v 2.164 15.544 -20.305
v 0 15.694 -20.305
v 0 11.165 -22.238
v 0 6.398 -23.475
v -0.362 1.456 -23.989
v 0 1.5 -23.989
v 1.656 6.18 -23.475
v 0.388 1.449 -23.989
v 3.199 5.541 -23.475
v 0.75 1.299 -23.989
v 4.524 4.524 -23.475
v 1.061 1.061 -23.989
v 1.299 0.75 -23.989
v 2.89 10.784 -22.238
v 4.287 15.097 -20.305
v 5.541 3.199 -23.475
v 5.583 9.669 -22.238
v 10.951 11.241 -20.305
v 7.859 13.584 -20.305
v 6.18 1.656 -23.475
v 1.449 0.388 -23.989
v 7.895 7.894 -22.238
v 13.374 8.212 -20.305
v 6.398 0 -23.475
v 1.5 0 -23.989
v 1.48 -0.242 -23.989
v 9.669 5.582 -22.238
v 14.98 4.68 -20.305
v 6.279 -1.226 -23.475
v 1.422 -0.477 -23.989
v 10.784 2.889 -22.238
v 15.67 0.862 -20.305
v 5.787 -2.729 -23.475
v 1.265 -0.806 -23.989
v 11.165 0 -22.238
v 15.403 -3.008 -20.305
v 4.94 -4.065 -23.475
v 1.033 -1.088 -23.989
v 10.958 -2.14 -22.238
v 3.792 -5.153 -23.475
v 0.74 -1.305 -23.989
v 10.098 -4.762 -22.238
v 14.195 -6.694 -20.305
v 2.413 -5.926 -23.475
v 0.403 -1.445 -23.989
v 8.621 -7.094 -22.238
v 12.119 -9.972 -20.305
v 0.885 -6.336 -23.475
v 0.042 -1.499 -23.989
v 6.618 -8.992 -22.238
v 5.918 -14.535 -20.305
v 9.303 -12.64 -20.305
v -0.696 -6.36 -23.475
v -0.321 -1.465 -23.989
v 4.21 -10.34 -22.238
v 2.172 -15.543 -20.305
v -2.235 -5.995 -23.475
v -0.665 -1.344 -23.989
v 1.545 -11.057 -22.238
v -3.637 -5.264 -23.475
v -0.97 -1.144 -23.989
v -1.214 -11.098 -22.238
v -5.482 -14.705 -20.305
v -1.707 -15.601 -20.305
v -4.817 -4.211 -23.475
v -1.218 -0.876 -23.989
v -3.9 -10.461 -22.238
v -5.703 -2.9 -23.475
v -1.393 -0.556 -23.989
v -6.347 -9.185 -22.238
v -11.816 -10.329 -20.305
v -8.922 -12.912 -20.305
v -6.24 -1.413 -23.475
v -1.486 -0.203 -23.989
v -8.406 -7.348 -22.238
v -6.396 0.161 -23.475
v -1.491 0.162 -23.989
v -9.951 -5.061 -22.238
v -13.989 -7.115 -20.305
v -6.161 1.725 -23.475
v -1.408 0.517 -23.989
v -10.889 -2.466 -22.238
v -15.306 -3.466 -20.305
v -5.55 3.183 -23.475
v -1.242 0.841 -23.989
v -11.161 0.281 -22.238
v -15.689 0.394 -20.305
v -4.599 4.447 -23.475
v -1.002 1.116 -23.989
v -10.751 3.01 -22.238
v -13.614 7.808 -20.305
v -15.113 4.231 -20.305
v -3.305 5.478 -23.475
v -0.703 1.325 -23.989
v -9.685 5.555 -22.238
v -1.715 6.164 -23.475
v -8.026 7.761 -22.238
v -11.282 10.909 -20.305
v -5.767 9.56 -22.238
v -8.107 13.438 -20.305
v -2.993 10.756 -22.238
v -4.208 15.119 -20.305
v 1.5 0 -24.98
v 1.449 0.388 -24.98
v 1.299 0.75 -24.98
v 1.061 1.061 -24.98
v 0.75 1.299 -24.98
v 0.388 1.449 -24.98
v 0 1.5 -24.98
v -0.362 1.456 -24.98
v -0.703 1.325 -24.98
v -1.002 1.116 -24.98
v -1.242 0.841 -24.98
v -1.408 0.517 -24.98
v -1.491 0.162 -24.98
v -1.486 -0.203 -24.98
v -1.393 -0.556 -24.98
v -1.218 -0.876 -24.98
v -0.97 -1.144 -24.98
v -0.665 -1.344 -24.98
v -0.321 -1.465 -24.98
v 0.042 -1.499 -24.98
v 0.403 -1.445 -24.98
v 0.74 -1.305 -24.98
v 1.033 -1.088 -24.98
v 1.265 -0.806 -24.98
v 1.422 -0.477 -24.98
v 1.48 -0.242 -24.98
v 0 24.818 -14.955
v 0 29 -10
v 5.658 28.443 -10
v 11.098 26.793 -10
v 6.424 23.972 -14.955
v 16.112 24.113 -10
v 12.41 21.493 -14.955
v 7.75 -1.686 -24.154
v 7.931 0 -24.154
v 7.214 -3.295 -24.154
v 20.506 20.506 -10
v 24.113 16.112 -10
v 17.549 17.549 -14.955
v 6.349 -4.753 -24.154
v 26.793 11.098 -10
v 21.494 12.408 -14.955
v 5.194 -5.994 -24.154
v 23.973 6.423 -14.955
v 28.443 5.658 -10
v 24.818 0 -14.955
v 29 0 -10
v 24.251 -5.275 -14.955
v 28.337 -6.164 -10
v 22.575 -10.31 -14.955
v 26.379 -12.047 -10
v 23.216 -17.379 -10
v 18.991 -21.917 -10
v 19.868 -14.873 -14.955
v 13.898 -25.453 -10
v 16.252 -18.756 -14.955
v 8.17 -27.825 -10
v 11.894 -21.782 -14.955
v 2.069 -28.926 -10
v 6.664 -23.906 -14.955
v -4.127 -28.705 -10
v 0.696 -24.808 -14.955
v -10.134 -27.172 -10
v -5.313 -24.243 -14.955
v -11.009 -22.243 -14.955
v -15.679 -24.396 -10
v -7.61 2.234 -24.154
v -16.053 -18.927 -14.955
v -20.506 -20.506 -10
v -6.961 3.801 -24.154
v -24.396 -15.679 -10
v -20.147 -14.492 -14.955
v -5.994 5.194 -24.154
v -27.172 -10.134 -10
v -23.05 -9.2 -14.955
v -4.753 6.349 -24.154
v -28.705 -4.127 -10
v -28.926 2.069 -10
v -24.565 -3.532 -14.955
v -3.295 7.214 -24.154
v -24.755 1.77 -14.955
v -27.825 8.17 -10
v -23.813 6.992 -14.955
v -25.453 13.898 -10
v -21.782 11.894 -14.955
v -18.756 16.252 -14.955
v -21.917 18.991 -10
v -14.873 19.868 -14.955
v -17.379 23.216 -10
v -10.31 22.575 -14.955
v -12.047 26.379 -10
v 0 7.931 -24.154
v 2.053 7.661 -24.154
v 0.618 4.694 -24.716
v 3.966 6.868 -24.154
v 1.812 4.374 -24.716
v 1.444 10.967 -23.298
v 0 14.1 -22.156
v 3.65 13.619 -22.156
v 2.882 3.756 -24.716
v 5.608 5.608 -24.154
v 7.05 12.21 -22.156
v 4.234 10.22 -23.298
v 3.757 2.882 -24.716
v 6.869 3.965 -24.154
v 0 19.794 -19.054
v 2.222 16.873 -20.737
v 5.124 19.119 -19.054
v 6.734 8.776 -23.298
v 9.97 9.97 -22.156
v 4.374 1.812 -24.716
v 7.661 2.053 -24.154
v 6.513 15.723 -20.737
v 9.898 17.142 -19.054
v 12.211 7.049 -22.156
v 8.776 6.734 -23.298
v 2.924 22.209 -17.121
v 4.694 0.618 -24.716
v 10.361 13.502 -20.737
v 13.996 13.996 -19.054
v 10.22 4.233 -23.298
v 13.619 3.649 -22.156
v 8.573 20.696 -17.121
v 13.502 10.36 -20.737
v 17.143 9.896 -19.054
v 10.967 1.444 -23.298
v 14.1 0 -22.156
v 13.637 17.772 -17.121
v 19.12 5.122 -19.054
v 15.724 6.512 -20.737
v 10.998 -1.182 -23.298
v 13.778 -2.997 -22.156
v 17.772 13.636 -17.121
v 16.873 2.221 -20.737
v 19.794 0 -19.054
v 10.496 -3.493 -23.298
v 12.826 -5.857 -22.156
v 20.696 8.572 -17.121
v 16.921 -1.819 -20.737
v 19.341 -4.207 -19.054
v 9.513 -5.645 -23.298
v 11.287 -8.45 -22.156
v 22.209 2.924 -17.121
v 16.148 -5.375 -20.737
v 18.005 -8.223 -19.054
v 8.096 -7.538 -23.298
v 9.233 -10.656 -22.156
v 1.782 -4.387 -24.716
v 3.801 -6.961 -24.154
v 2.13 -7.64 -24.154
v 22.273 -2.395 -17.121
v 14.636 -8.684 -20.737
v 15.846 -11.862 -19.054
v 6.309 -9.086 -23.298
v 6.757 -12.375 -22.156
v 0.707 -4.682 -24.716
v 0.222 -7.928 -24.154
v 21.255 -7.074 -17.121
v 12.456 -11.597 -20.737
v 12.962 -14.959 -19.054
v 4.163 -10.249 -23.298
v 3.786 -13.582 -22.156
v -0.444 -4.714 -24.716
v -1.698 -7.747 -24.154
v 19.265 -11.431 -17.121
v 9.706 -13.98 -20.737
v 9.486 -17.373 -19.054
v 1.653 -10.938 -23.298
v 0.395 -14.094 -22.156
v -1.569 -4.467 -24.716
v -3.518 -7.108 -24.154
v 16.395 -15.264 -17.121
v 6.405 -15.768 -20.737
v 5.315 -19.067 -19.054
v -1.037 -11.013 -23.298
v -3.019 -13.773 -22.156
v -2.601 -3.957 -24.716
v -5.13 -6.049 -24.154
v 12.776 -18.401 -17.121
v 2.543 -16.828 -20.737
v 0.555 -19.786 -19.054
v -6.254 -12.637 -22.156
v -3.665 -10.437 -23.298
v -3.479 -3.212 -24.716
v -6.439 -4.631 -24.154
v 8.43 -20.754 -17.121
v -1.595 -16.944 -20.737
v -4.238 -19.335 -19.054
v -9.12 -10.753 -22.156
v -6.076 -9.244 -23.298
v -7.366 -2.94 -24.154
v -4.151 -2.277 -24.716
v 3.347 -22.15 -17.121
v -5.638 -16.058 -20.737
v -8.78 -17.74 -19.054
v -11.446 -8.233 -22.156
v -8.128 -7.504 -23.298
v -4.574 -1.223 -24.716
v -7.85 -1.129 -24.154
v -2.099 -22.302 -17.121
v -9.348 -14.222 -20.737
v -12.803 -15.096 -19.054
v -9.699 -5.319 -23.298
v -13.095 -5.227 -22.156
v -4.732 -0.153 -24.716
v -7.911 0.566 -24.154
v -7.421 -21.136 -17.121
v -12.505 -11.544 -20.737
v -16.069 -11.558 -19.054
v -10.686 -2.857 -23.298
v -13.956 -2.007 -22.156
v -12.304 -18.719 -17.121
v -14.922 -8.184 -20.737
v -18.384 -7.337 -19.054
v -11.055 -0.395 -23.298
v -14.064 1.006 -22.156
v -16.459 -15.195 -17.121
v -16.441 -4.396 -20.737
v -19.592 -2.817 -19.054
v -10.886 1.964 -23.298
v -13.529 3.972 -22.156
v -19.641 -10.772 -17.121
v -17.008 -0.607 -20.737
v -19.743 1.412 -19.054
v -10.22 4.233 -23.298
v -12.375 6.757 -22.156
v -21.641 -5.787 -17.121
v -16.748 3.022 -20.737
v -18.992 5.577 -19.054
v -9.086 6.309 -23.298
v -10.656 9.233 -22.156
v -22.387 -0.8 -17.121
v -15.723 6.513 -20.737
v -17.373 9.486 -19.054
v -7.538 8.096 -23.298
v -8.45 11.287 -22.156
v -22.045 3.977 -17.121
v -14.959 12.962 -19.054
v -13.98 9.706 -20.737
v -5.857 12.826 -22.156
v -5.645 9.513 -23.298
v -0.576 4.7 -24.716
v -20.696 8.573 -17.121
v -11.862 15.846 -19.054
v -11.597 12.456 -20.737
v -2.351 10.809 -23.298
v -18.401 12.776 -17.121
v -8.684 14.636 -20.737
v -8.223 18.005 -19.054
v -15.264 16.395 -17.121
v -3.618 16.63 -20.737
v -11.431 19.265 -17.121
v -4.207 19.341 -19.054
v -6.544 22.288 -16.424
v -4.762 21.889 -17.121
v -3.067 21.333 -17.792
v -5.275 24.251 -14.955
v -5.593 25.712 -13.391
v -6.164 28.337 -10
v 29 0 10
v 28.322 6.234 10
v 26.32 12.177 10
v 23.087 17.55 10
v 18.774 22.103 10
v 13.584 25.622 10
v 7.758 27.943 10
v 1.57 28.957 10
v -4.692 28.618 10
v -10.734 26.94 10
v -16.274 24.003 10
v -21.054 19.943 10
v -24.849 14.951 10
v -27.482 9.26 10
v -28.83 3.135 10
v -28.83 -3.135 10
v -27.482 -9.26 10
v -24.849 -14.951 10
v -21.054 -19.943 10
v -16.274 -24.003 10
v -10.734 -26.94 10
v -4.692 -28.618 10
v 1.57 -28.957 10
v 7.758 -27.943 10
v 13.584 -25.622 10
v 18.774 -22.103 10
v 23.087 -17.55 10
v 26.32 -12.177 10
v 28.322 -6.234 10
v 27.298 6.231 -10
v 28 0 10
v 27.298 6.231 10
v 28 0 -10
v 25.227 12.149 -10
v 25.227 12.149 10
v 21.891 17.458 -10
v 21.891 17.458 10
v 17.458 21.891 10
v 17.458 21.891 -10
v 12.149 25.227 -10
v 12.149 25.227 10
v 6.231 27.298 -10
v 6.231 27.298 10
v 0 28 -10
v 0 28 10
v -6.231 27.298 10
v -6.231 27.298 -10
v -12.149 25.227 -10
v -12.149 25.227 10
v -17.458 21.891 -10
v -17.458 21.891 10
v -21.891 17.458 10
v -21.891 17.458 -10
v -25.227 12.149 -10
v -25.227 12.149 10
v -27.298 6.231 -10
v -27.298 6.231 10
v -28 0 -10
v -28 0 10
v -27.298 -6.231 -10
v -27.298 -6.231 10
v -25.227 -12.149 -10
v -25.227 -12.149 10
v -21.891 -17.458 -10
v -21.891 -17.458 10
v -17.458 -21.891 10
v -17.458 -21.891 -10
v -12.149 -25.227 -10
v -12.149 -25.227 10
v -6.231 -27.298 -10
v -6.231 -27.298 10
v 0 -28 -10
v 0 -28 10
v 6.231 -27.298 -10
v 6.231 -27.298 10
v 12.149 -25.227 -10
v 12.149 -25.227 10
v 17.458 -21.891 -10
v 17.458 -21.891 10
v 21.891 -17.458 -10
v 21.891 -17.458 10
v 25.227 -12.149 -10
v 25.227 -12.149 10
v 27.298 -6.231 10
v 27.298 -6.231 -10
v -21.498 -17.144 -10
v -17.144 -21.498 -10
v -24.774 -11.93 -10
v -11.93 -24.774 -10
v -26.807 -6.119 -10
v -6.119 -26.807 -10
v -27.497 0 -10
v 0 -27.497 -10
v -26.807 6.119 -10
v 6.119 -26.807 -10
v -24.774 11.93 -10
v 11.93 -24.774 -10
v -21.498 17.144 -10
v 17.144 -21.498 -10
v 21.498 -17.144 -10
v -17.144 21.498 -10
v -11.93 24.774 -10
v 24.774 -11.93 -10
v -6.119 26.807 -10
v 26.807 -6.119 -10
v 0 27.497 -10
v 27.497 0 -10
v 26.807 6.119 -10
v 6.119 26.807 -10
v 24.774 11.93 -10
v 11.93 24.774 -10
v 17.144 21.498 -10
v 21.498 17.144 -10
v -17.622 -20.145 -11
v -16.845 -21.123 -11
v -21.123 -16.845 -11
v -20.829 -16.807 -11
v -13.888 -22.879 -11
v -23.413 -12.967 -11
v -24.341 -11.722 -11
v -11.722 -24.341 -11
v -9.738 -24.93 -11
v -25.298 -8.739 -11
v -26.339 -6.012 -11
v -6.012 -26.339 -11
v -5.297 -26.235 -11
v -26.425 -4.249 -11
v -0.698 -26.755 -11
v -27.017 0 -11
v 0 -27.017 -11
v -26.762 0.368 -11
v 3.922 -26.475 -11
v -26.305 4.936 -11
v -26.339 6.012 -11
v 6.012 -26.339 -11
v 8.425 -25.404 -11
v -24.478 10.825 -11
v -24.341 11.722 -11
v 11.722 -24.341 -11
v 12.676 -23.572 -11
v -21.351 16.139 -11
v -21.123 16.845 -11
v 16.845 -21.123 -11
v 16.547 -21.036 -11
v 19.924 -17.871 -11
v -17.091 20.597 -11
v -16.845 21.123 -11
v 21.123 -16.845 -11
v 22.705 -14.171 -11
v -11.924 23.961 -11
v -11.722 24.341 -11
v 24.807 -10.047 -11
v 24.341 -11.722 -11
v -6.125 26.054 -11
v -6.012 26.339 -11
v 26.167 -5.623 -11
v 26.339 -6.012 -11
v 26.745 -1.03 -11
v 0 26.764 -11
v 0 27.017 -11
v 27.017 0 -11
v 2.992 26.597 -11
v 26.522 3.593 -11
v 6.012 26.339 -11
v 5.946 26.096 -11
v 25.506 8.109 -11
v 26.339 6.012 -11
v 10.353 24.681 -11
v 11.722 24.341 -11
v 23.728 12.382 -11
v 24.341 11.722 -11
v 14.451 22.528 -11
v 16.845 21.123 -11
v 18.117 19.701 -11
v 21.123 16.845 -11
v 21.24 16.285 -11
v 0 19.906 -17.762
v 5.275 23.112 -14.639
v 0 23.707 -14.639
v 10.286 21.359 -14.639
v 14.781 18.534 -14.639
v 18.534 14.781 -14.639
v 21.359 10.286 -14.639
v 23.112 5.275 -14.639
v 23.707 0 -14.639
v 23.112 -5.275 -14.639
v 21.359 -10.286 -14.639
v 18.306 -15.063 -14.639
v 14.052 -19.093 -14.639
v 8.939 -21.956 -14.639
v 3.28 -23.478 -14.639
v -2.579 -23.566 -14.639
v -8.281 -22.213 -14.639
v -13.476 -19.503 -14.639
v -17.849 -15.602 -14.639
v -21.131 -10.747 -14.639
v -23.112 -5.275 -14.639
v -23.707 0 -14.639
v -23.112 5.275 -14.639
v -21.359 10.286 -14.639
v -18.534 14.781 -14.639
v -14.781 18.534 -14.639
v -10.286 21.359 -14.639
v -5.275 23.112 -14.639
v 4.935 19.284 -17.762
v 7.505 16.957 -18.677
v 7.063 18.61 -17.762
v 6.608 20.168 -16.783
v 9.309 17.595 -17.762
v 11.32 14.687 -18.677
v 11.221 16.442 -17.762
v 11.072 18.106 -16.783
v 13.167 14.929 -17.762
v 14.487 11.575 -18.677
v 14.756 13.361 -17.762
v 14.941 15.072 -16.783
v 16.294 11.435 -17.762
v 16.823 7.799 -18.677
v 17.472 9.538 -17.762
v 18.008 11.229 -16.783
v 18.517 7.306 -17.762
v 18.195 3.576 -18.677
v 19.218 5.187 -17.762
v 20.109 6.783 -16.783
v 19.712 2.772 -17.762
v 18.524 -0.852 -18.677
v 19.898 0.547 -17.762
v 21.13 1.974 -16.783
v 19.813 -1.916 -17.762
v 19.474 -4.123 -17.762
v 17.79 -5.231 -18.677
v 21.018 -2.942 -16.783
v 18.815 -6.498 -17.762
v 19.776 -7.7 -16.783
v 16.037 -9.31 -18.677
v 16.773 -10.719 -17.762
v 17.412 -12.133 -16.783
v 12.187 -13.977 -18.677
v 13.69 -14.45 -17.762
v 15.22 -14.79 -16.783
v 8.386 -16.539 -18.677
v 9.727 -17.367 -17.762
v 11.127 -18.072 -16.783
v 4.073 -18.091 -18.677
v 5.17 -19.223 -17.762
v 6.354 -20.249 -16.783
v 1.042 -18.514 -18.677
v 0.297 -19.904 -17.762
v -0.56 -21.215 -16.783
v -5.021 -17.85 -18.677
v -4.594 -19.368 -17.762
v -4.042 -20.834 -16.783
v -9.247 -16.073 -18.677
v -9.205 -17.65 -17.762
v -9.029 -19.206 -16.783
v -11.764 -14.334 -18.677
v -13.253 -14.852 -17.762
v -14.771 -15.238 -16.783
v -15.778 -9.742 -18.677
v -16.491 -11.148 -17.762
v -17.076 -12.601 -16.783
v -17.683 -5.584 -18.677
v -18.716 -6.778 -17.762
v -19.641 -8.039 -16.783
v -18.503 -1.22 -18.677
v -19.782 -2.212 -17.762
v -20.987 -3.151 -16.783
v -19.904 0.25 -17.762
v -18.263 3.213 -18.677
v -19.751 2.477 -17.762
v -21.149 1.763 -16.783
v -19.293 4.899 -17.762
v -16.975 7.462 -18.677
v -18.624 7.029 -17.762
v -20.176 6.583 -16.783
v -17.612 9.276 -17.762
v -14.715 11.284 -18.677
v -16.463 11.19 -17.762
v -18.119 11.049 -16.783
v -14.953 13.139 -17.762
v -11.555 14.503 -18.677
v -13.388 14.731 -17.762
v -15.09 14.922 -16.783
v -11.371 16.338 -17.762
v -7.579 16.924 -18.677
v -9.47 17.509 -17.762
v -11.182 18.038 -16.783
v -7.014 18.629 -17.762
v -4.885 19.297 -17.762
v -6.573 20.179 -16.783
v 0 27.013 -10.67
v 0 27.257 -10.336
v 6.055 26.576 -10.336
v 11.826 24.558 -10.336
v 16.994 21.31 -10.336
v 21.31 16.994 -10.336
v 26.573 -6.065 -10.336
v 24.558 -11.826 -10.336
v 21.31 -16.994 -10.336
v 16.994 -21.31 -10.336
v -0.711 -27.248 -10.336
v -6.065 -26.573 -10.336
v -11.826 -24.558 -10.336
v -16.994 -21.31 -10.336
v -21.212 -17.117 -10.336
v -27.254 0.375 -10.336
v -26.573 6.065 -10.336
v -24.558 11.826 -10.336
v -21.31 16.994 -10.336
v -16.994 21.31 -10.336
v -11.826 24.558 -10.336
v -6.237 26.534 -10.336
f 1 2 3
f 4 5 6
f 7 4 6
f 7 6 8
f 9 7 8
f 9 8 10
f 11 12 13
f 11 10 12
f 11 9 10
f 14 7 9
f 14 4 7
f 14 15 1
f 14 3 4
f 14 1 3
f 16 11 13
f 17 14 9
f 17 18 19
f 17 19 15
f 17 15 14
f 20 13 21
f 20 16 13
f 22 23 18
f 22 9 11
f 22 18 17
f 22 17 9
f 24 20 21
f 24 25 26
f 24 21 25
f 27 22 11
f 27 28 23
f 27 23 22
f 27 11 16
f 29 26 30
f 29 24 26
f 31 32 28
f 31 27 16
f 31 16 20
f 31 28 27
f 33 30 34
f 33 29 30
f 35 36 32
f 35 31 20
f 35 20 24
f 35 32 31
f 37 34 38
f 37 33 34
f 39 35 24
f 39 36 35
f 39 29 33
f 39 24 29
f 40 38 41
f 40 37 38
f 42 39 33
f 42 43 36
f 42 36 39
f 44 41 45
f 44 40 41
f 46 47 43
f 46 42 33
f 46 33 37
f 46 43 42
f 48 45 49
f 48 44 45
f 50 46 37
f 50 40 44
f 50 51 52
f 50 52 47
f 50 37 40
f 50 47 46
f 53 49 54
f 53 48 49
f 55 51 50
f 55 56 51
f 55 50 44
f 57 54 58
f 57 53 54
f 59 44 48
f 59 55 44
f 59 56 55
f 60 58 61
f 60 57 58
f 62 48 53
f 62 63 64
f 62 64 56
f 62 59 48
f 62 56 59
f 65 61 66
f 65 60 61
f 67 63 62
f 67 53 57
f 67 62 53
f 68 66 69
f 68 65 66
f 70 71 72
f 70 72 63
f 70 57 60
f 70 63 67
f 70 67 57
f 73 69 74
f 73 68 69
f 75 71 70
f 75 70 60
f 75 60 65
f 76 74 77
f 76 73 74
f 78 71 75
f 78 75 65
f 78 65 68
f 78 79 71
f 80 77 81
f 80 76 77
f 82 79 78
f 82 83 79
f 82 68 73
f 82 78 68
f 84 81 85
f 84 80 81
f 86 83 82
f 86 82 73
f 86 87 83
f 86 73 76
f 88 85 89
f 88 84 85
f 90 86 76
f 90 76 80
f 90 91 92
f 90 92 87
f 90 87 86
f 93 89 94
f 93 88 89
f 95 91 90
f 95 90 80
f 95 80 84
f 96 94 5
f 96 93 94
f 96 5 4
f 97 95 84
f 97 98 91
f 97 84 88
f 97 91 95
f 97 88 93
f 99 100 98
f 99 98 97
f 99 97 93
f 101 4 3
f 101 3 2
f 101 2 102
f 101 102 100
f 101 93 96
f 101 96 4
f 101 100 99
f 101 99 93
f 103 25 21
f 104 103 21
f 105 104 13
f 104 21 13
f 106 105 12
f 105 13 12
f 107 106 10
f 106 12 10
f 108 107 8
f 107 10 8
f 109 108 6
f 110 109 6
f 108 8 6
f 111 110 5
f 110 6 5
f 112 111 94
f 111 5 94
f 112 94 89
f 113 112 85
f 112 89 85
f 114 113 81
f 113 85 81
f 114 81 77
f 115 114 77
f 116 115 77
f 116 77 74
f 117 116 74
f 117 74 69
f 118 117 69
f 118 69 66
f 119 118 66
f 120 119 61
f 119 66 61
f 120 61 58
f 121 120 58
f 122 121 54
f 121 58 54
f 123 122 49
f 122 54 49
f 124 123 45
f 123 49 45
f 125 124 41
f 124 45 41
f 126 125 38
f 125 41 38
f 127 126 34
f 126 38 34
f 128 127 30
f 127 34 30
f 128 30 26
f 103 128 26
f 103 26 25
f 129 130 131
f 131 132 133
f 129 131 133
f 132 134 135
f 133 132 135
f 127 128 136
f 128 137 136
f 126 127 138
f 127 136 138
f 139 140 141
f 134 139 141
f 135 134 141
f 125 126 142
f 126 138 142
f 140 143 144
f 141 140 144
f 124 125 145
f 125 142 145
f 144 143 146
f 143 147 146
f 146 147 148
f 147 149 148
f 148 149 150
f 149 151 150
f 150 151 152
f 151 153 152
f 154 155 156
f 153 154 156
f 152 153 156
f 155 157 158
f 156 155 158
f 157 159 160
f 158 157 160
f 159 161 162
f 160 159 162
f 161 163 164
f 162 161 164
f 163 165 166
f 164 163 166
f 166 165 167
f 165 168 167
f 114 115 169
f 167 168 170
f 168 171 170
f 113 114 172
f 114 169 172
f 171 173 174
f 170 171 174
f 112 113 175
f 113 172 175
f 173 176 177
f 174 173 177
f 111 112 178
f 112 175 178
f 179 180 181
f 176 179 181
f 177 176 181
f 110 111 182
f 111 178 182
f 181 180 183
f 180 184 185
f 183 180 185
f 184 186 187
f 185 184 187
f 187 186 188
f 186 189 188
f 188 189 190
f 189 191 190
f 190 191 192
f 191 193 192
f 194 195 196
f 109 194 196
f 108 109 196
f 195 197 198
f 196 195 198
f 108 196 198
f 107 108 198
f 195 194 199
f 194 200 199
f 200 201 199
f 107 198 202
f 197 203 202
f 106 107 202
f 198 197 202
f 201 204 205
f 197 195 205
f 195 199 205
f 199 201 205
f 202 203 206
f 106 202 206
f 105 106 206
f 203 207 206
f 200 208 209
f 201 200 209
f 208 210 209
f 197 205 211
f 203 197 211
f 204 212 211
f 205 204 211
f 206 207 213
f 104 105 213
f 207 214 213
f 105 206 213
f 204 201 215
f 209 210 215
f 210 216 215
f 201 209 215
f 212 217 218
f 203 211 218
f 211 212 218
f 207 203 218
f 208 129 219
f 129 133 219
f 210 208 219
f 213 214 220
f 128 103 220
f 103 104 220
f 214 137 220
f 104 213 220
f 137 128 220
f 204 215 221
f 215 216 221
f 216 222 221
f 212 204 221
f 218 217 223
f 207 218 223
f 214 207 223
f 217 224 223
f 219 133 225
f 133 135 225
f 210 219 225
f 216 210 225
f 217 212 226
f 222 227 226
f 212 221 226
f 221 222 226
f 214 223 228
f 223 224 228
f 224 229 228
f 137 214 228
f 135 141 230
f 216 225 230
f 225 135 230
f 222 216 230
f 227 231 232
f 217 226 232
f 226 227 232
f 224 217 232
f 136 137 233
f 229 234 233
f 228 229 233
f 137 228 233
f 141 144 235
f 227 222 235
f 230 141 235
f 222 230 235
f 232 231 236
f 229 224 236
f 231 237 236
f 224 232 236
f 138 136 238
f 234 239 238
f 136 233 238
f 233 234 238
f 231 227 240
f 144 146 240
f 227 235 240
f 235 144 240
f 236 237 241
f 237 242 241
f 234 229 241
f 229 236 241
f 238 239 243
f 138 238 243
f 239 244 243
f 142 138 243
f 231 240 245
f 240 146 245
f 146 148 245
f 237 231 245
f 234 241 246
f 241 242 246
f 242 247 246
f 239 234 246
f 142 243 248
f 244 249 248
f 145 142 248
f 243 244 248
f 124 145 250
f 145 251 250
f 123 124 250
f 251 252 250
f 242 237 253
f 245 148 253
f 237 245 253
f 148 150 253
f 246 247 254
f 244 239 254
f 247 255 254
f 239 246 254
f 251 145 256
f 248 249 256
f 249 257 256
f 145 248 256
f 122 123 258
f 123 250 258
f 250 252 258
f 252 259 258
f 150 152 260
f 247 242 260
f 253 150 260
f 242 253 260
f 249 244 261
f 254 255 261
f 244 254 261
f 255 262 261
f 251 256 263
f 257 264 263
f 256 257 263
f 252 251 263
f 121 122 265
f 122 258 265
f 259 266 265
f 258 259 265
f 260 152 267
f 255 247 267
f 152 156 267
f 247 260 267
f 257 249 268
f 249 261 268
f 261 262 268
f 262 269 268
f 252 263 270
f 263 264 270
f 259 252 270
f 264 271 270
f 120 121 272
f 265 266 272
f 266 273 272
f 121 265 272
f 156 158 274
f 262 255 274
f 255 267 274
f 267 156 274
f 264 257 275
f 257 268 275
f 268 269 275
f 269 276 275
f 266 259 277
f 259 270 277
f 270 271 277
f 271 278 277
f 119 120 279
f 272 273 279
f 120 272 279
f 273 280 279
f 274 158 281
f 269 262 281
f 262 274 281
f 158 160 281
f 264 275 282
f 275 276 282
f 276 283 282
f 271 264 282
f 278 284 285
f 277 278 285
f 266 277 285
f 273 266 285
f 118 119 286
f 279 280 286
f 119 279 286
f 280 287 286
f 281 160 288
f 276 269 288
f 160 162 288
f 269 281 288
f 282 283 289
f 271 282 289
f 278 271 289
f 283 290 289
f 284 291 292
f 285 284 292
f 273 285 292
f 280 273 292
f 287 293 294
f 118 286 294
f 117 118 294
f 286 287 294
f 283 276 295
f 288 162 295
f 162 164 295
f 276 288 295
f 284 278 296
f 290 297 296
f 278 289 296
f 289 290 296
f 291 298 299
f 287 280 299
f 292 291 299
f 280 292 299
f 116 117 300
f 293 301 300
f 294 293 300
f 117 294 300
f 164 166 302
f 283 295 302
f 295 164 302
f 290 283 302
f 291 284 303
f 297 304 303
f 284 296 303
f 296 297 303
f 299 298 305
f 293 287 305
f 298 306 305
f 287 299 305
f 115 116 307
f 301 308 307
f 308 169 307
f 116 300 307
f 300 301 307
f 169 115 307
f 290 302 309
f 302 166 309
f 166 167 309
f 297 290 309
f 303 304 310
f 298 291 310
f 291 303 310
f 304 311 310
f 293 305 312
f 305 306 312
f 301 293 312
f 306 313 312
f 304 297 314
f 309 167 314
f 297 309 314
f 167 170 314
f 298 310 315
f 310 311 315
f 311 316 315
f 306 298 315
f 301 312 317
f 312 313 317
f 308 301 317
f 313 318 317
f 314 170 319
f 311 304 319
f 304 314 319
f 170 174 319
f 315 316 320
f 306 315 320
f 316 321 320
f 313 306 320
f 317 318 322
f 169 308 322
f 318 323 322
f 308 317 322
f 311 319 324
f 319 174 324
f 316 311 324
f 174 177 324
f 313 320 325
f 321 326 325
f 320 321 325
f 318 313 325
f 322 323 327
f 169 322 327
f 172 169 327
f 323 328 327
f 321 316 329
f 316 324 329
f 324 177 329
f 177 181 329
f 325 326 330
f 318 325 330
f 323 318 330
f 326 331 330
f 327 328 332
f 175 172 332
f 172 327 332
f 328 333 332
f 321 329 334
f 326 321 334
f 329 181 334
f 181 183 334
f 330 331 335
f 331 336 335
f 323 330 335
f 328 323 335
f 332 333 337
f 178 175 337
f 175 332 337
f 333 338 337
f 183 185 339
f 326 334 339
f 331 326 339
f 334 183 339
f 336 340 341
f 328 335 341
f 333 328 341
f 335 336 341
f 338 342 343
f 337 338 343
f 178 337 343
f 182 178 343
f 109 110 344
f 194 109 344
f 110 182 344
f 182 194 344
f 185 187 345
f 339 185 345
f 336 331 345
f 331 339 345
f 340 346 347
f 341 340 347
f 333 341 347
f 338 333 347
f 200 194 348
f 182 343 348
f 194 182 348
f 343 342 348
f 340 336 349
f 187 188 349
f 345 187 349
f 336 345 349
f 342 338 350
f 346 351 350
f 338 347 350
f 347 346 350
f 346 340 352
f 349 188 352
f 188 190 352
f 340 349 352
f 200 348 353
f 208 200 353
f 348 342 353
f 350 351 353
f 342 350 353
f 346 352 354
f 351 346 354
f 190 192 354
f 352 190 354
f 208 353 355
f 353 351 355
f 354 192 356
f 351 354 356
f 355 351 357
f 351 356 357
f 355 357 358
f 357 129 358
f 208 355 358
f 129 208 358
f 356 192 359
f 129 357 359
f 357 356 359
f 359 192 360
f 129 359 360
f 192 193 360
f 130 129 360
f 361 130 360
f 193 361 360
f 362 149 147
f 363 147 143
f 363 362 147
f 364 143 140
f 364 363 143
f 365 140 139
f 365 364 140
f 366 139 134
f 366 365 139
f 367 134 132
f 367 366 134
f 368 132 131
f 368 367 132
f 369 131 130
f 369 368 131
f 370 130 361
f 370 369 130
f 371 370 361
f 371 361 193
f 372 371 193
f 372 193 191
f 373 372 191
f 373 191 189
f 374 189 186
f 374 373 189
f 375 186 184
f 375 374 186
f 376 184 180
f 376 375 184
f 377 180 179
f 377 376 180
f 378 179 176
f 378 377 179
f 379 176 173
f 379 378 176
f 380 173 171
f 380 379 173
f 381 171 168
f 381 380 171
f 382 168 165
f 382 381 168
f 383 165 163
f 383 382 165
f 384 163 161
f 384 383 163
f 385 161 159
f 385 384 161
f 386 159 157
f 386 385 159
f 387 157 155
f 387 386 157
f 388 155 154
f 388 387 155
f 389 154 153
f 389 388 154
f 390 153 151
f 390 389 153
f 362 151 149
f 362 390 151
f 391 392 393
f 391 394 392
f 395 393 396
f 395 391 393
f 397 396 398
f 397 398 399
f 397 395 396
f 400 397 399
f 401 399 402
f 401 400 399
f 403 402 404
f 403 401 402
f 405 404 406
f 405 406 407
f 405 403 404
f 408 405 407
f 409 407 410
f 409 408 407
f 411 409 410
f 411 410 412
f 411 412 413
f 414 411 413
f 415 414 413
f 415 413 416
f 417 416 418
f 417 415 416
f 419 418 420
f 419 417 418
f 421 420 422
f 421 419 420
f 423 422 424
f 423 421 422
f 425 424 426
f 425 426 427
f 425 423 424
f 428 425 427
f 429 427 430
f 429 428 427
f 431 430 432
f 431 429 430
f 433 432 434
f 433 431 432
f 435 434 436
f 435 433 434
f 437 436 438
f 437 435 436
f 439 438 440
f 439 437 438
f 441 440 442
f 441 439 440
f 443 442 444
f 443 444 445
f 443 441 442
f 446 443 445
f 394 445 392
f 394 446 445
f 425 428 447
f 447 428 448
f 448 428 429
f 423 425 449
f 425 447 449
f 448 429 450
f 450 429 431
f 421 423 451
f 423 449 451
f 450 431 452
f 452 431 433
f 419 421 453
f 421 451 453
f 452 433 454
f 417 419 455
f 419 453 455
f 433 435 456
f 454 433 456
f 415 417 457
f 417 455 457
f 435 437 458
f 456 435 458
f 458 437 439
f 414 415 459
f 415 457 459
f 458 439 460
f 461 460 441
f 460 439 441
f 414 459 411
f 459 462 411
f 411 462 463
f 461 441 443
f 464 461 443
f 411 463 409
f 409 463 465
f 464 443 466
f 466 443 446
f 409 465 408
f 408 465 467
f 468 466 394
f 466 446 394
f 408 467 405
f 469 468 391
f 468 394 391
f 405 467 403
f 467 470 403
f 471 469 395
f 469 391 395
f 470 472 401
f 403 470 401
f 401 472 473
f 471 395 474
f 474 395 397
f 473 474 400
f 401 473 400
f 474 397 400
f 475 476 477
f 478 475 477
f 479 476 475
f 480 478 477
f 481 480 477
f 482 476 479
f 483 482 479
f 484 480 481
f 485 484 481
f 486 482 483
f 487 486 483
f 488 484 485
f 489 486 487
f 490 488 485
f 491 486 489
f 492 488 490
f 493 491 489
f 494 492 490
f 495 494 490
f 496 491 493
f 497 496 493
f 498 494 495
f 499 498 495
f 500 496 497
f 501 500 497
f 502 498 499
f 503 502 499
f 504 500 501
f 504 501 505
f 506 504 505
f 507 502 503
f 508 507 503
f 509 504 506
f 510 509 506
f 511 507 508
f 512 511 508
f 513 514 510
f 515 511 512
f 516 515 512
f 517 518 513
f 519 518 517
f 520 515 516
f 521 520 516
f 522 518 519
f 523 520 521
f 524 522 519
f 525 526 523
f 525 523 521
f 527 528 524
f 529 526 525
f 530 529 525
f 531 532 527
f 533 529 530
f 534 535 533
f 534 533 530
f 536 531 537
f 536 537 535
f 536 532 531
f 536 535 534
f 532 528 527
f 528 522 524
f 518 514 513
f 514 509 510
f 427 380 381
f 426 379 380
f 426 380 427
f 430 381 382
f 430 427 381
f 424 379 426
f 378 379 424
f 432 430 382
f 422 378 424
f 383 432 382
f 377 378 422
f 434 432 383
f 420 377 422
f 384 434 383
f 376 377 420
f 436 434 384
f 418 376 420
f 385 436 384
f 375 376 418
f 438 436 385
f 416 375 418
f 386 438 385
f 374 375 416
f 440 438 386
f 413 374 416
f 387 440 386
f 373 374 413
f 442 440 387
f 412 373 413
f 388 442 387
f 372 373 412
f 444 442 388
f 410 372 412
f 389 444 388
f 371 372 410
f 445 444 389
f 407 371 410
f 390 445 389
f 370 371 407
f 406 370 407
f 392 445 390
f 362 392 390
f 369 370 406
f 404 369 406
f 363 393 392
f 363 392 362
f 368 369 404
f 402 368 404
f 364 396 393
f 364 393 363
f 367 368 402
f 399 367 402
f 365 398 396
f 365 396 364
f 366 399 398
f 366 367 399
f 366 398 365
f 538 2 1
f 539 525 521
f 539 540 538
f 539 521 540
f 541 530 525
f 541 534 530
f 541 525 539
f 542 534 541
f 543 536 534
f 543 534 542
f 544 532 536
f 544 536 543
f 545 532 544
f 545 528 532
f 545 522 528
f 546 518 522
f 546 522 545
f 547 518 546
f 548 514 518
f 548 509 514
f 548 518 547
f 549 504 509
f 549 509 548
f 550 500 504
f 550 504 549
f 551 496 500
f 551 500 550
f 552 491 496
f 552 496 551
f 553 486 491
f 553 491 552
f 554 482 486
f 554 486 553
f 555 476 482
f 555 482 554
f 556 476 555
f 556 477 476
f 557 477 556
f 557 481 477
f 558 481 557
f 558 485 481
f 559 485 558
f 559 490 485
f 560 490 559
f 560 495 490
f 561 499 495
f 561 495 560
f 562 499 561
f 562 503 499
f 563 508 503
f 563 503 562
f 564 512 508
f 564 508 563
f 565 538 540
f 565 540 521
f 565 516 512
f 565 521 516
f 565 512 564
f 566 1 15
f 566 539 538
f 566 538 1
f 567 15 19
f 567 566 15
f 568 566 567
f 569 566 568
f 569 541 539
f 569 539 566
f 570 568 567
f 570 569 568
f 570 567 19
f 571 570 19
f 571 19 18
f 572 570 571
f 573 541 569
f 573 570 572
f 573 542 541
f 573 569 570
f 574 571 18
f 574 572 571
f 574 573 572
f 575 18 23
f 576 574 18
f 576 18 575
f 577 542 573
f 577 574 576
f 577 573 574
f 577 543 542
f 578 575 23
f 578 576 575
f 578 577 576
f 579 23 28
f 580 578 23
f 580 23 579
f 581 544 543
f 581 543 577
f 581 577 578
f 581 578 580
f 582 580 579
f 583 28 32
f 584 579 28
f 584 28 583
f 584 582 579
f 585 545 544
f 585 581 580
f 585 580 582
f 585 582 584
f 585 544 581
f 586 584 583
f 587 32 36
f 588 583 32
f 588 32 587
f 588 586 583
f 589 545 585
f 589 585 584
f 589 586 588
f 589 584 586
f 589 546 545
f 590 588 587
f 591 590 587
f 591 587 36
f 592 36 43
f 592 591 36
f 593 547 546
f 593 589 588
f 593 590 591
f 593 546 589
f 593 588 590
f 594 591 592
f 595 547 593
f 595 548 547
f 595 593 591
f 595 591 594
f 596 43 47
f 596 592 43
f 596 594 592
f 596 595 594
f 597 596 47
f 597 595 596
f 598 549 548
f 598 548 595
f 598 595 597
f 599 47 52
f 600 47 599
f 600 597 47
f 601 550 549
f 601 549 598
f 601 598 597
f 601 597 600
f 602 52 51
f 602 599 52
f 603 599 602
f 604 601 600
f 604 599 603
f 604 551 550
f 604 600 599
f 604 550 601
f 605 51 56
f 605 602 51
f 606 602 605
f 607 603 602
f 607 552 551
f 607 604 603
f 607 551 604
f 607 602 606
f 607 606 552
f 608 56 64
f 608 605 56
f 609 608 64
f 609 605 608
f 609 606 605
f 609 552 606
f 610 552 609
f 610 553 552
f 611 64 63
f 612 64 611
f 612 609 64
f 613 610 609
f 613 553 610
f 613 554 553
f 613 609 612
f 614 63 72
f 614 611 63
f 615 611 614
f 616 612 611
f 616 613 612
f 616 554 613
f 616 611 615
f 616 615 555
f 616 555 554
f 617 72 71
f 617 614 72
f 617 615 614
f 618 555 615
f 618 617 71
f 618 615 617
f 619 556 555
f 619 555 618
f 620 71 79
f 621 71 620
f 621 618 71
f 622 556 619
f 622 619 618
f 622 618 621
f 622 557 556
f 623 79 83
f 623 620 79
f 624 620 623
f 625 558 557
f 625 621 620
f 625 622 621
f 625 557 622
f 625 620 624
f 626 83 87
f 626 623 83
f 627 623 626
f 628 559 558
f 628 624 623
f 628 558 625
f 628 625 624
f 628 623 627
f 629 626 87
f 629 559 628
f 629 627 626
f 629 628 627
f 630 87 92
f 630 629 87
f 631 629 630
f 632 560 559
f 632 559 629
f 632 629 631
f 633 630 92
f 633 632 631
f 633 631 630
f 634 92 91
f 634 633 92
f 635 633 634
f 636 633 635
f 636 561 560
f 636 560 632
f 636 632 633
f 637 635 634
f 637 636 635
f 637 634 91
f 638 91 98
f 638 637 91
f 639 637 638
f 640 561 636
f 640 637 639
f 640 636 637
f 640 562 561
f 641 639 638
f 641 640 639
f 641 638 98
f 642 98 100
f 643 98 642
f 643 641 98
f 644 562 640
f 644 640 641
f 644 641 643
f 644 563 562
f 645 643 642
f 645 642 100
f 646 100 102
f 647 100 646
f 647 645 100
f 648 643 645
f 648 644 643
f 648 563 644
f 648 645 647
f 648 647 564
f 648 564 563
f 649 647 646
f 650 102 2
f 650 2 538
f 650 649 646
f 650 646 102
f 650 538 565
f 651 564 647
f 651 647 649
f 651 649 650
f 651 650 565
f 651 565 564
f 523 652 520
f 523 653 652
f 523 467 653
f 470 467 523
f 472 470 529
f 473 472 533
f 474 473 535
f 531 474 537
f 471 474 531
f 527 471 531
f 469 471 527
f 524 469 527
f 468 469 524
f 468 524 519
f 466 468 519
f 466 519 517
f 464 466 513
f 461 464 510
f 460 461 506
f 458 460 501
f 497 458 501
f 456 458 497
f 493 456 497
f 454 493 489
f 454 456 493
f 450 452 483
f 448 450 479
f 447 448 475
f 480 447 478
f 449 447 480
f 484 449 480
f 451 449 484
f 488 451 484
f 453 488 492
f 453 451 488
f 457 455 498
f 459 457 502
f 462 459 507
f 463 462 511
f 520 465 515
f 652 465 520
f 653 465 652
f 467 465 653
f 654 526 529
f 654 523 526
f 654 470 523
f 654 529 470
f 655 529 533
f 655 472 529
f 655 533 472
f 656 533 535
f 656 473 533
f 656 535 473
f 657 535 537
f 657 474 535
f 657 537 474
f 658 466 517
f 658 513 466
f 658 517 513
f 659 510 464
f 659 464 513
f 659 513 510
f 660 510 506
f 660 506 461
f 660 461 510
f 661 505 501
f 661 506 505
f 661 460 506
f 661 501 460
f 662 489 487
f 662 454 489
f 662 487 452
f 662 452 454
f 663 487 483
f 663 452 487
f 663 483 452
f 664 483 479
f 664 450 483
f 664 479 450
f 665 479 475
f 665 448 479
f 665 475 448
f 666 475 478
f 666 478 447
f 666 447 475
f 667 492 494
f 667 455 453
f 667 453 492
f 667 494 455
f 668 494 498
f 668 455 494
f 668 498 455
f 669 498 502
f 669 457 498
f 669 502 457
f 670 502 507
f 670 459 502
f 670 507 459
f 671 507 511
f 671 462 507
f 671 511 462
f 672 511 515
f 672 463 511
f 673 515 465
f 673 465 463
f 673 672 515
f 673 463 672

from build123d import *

# Parameters (mm, degrees)
SKETCH1_R           = 29
SKETCH1_R_2         = 28
EXTRUDE_THIN1_DEPTH = 10
SKETCH16_R          = 1.5
CUT_EXTRUDE2_DEPTH  = 26.001091713
SKETCH6_R           = 1.5
CUT_EXTRUDE1_DEPTH  = 1


with BuildPart() as part:
    # Sketch1 → Extrude-Thin1 (new body, symmetric)
    with BuildSketch(Plane.XY):
        Circle(SKETCH1_R)
        Circle(SKETCH1_R_2, mode=Mode.SUBTRACT)
    extrude(amount=EXTRUDE_THIN1_DEPTH, both=True)

    # Sketch5 → Revolve-Thin4 (revolve)
    with BuildSketch(Plane(origin=(0, 0, 0), x_dir=(0, 0, -1), z_dir=(1, 0, 0))):
        with BuildLine():
            Line((10, 29), (10, 0))
            Line((10, 0), (25, 0))
            ThreePointArc((25, 0), (21.088709123, 16.356228857), (10, 29))
        make_face()
        with BuildLine():
            Line((11, 27.016767879), (11, 1))
            Line((11, 1), (23.993391354, 1))
            ThreePointArc((23.993391354, 1), (20.418624313, 15.467664449), (11, 27.016767879))
        make_face(mode=Mode.SUBTRACT)
    revolve(axis=Axis((0, 0, 0), (0, 0, -1)))

    # Sketch7 → Cut-Revolve1 (revolve, cut)
    with BuildSketch(Plane(origin=(0, 0, 0), x_dir=(0, 0, -1), z_dir=(1, 0, 0))):
        with BuildLine():
            Line((10, 0), (24, 0))
            ThreePointArc((24, 0), (20.411655154, 15.485438383), (10, 27.496785417))
            Line((10, 27.496785417), (10, 0))
        make_face()
    revolve(axis=Axis((0, 0, -10), (0, 0, -1)), mode=Mode.SUBTRACT)

    # Sketch16 → Cut-Extrude2 (cut, through all)
    with BuildSketch(Plane.XY):
        Circle(SKETCH16_R)
    extrude(amount=-CUT_EXTRUDE2_DEPTH, mode=Mode.SUBTRACT)

    # Sketch6 → Cut-Extrude1 (cut)
    with BuildSketch(Plane.XY.offset(-10)):
        Circle(SKETCH6_R)
    extrude(amount=-CUT_EXTRUDE1_DEPTH, mode=Mode.SUBTRACT)


solid = part.part
